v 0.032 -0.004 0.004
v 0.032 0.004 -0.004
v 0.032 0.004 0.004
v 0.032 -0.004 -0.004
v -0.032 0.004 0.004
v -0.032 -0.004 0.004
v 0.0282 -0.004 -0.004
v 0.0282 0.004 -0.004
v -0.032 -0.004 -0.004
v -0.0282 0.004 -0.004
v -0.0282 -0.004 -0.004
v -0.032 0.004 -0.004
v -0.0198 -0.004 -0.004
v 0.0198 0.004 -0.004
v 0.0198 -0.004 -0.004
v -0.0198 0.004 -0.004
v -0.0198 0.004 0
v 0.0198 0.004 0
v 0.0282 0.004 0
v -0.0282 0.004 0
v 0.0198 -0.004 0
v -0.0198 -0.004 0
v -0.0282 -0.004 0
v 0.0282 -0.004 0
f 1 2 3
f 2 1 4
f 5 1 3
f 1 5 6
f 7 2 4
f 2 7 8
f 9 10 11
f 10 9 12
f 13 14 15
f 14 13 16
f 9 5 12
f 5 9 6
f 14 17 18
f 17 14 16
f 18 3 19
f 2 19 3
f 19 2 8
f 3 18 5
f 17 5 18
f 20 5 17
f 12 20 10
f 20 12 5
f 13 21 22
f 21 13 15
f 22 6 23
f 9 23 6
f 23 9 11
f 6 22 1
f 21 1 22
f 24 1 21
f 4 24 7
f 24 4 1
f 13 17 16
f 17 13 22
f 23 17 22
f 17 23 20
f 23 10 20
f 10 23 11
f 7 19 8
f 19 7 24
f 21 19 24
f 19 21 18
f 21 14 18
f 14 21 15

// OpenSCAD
// Oneirifact graph source-first OpenSCAD emission (R96)
// source revision: sha256:33e8153b932e2d91ed841b628992587f6f0509b34339bca32328719a6d7b35ae
// SCAD units: meters, Z-up; $fn is tessellation only
module of_f0() {
  cube([0.64000000000000001, 0.080000000000000002, 0.080000000000000002], center=true);
}
module of_f1() {
  cube([0.083999999999999991, 0.10000000000000001, 0.041999999999999996], center=true);
}
module of_f2() {
  translate([-0.23999999999999999, 0, -0.020999999999999998]) of_f1();
}
module of_f3() {
  difference() { of_f0(); of_f2(); }
}
module of_f4() {
  translate([0.23999999999999999, 0, -0.020999999999999998]) of_f1();
}
module of_f5() {
  difference() { of_f3(); of_f4(); }
}
module of_f6() {
  scale([0.10000000000000001, 0.10000000000000001, 0.10000000000000001]) of_f5();
}
of_f6();
